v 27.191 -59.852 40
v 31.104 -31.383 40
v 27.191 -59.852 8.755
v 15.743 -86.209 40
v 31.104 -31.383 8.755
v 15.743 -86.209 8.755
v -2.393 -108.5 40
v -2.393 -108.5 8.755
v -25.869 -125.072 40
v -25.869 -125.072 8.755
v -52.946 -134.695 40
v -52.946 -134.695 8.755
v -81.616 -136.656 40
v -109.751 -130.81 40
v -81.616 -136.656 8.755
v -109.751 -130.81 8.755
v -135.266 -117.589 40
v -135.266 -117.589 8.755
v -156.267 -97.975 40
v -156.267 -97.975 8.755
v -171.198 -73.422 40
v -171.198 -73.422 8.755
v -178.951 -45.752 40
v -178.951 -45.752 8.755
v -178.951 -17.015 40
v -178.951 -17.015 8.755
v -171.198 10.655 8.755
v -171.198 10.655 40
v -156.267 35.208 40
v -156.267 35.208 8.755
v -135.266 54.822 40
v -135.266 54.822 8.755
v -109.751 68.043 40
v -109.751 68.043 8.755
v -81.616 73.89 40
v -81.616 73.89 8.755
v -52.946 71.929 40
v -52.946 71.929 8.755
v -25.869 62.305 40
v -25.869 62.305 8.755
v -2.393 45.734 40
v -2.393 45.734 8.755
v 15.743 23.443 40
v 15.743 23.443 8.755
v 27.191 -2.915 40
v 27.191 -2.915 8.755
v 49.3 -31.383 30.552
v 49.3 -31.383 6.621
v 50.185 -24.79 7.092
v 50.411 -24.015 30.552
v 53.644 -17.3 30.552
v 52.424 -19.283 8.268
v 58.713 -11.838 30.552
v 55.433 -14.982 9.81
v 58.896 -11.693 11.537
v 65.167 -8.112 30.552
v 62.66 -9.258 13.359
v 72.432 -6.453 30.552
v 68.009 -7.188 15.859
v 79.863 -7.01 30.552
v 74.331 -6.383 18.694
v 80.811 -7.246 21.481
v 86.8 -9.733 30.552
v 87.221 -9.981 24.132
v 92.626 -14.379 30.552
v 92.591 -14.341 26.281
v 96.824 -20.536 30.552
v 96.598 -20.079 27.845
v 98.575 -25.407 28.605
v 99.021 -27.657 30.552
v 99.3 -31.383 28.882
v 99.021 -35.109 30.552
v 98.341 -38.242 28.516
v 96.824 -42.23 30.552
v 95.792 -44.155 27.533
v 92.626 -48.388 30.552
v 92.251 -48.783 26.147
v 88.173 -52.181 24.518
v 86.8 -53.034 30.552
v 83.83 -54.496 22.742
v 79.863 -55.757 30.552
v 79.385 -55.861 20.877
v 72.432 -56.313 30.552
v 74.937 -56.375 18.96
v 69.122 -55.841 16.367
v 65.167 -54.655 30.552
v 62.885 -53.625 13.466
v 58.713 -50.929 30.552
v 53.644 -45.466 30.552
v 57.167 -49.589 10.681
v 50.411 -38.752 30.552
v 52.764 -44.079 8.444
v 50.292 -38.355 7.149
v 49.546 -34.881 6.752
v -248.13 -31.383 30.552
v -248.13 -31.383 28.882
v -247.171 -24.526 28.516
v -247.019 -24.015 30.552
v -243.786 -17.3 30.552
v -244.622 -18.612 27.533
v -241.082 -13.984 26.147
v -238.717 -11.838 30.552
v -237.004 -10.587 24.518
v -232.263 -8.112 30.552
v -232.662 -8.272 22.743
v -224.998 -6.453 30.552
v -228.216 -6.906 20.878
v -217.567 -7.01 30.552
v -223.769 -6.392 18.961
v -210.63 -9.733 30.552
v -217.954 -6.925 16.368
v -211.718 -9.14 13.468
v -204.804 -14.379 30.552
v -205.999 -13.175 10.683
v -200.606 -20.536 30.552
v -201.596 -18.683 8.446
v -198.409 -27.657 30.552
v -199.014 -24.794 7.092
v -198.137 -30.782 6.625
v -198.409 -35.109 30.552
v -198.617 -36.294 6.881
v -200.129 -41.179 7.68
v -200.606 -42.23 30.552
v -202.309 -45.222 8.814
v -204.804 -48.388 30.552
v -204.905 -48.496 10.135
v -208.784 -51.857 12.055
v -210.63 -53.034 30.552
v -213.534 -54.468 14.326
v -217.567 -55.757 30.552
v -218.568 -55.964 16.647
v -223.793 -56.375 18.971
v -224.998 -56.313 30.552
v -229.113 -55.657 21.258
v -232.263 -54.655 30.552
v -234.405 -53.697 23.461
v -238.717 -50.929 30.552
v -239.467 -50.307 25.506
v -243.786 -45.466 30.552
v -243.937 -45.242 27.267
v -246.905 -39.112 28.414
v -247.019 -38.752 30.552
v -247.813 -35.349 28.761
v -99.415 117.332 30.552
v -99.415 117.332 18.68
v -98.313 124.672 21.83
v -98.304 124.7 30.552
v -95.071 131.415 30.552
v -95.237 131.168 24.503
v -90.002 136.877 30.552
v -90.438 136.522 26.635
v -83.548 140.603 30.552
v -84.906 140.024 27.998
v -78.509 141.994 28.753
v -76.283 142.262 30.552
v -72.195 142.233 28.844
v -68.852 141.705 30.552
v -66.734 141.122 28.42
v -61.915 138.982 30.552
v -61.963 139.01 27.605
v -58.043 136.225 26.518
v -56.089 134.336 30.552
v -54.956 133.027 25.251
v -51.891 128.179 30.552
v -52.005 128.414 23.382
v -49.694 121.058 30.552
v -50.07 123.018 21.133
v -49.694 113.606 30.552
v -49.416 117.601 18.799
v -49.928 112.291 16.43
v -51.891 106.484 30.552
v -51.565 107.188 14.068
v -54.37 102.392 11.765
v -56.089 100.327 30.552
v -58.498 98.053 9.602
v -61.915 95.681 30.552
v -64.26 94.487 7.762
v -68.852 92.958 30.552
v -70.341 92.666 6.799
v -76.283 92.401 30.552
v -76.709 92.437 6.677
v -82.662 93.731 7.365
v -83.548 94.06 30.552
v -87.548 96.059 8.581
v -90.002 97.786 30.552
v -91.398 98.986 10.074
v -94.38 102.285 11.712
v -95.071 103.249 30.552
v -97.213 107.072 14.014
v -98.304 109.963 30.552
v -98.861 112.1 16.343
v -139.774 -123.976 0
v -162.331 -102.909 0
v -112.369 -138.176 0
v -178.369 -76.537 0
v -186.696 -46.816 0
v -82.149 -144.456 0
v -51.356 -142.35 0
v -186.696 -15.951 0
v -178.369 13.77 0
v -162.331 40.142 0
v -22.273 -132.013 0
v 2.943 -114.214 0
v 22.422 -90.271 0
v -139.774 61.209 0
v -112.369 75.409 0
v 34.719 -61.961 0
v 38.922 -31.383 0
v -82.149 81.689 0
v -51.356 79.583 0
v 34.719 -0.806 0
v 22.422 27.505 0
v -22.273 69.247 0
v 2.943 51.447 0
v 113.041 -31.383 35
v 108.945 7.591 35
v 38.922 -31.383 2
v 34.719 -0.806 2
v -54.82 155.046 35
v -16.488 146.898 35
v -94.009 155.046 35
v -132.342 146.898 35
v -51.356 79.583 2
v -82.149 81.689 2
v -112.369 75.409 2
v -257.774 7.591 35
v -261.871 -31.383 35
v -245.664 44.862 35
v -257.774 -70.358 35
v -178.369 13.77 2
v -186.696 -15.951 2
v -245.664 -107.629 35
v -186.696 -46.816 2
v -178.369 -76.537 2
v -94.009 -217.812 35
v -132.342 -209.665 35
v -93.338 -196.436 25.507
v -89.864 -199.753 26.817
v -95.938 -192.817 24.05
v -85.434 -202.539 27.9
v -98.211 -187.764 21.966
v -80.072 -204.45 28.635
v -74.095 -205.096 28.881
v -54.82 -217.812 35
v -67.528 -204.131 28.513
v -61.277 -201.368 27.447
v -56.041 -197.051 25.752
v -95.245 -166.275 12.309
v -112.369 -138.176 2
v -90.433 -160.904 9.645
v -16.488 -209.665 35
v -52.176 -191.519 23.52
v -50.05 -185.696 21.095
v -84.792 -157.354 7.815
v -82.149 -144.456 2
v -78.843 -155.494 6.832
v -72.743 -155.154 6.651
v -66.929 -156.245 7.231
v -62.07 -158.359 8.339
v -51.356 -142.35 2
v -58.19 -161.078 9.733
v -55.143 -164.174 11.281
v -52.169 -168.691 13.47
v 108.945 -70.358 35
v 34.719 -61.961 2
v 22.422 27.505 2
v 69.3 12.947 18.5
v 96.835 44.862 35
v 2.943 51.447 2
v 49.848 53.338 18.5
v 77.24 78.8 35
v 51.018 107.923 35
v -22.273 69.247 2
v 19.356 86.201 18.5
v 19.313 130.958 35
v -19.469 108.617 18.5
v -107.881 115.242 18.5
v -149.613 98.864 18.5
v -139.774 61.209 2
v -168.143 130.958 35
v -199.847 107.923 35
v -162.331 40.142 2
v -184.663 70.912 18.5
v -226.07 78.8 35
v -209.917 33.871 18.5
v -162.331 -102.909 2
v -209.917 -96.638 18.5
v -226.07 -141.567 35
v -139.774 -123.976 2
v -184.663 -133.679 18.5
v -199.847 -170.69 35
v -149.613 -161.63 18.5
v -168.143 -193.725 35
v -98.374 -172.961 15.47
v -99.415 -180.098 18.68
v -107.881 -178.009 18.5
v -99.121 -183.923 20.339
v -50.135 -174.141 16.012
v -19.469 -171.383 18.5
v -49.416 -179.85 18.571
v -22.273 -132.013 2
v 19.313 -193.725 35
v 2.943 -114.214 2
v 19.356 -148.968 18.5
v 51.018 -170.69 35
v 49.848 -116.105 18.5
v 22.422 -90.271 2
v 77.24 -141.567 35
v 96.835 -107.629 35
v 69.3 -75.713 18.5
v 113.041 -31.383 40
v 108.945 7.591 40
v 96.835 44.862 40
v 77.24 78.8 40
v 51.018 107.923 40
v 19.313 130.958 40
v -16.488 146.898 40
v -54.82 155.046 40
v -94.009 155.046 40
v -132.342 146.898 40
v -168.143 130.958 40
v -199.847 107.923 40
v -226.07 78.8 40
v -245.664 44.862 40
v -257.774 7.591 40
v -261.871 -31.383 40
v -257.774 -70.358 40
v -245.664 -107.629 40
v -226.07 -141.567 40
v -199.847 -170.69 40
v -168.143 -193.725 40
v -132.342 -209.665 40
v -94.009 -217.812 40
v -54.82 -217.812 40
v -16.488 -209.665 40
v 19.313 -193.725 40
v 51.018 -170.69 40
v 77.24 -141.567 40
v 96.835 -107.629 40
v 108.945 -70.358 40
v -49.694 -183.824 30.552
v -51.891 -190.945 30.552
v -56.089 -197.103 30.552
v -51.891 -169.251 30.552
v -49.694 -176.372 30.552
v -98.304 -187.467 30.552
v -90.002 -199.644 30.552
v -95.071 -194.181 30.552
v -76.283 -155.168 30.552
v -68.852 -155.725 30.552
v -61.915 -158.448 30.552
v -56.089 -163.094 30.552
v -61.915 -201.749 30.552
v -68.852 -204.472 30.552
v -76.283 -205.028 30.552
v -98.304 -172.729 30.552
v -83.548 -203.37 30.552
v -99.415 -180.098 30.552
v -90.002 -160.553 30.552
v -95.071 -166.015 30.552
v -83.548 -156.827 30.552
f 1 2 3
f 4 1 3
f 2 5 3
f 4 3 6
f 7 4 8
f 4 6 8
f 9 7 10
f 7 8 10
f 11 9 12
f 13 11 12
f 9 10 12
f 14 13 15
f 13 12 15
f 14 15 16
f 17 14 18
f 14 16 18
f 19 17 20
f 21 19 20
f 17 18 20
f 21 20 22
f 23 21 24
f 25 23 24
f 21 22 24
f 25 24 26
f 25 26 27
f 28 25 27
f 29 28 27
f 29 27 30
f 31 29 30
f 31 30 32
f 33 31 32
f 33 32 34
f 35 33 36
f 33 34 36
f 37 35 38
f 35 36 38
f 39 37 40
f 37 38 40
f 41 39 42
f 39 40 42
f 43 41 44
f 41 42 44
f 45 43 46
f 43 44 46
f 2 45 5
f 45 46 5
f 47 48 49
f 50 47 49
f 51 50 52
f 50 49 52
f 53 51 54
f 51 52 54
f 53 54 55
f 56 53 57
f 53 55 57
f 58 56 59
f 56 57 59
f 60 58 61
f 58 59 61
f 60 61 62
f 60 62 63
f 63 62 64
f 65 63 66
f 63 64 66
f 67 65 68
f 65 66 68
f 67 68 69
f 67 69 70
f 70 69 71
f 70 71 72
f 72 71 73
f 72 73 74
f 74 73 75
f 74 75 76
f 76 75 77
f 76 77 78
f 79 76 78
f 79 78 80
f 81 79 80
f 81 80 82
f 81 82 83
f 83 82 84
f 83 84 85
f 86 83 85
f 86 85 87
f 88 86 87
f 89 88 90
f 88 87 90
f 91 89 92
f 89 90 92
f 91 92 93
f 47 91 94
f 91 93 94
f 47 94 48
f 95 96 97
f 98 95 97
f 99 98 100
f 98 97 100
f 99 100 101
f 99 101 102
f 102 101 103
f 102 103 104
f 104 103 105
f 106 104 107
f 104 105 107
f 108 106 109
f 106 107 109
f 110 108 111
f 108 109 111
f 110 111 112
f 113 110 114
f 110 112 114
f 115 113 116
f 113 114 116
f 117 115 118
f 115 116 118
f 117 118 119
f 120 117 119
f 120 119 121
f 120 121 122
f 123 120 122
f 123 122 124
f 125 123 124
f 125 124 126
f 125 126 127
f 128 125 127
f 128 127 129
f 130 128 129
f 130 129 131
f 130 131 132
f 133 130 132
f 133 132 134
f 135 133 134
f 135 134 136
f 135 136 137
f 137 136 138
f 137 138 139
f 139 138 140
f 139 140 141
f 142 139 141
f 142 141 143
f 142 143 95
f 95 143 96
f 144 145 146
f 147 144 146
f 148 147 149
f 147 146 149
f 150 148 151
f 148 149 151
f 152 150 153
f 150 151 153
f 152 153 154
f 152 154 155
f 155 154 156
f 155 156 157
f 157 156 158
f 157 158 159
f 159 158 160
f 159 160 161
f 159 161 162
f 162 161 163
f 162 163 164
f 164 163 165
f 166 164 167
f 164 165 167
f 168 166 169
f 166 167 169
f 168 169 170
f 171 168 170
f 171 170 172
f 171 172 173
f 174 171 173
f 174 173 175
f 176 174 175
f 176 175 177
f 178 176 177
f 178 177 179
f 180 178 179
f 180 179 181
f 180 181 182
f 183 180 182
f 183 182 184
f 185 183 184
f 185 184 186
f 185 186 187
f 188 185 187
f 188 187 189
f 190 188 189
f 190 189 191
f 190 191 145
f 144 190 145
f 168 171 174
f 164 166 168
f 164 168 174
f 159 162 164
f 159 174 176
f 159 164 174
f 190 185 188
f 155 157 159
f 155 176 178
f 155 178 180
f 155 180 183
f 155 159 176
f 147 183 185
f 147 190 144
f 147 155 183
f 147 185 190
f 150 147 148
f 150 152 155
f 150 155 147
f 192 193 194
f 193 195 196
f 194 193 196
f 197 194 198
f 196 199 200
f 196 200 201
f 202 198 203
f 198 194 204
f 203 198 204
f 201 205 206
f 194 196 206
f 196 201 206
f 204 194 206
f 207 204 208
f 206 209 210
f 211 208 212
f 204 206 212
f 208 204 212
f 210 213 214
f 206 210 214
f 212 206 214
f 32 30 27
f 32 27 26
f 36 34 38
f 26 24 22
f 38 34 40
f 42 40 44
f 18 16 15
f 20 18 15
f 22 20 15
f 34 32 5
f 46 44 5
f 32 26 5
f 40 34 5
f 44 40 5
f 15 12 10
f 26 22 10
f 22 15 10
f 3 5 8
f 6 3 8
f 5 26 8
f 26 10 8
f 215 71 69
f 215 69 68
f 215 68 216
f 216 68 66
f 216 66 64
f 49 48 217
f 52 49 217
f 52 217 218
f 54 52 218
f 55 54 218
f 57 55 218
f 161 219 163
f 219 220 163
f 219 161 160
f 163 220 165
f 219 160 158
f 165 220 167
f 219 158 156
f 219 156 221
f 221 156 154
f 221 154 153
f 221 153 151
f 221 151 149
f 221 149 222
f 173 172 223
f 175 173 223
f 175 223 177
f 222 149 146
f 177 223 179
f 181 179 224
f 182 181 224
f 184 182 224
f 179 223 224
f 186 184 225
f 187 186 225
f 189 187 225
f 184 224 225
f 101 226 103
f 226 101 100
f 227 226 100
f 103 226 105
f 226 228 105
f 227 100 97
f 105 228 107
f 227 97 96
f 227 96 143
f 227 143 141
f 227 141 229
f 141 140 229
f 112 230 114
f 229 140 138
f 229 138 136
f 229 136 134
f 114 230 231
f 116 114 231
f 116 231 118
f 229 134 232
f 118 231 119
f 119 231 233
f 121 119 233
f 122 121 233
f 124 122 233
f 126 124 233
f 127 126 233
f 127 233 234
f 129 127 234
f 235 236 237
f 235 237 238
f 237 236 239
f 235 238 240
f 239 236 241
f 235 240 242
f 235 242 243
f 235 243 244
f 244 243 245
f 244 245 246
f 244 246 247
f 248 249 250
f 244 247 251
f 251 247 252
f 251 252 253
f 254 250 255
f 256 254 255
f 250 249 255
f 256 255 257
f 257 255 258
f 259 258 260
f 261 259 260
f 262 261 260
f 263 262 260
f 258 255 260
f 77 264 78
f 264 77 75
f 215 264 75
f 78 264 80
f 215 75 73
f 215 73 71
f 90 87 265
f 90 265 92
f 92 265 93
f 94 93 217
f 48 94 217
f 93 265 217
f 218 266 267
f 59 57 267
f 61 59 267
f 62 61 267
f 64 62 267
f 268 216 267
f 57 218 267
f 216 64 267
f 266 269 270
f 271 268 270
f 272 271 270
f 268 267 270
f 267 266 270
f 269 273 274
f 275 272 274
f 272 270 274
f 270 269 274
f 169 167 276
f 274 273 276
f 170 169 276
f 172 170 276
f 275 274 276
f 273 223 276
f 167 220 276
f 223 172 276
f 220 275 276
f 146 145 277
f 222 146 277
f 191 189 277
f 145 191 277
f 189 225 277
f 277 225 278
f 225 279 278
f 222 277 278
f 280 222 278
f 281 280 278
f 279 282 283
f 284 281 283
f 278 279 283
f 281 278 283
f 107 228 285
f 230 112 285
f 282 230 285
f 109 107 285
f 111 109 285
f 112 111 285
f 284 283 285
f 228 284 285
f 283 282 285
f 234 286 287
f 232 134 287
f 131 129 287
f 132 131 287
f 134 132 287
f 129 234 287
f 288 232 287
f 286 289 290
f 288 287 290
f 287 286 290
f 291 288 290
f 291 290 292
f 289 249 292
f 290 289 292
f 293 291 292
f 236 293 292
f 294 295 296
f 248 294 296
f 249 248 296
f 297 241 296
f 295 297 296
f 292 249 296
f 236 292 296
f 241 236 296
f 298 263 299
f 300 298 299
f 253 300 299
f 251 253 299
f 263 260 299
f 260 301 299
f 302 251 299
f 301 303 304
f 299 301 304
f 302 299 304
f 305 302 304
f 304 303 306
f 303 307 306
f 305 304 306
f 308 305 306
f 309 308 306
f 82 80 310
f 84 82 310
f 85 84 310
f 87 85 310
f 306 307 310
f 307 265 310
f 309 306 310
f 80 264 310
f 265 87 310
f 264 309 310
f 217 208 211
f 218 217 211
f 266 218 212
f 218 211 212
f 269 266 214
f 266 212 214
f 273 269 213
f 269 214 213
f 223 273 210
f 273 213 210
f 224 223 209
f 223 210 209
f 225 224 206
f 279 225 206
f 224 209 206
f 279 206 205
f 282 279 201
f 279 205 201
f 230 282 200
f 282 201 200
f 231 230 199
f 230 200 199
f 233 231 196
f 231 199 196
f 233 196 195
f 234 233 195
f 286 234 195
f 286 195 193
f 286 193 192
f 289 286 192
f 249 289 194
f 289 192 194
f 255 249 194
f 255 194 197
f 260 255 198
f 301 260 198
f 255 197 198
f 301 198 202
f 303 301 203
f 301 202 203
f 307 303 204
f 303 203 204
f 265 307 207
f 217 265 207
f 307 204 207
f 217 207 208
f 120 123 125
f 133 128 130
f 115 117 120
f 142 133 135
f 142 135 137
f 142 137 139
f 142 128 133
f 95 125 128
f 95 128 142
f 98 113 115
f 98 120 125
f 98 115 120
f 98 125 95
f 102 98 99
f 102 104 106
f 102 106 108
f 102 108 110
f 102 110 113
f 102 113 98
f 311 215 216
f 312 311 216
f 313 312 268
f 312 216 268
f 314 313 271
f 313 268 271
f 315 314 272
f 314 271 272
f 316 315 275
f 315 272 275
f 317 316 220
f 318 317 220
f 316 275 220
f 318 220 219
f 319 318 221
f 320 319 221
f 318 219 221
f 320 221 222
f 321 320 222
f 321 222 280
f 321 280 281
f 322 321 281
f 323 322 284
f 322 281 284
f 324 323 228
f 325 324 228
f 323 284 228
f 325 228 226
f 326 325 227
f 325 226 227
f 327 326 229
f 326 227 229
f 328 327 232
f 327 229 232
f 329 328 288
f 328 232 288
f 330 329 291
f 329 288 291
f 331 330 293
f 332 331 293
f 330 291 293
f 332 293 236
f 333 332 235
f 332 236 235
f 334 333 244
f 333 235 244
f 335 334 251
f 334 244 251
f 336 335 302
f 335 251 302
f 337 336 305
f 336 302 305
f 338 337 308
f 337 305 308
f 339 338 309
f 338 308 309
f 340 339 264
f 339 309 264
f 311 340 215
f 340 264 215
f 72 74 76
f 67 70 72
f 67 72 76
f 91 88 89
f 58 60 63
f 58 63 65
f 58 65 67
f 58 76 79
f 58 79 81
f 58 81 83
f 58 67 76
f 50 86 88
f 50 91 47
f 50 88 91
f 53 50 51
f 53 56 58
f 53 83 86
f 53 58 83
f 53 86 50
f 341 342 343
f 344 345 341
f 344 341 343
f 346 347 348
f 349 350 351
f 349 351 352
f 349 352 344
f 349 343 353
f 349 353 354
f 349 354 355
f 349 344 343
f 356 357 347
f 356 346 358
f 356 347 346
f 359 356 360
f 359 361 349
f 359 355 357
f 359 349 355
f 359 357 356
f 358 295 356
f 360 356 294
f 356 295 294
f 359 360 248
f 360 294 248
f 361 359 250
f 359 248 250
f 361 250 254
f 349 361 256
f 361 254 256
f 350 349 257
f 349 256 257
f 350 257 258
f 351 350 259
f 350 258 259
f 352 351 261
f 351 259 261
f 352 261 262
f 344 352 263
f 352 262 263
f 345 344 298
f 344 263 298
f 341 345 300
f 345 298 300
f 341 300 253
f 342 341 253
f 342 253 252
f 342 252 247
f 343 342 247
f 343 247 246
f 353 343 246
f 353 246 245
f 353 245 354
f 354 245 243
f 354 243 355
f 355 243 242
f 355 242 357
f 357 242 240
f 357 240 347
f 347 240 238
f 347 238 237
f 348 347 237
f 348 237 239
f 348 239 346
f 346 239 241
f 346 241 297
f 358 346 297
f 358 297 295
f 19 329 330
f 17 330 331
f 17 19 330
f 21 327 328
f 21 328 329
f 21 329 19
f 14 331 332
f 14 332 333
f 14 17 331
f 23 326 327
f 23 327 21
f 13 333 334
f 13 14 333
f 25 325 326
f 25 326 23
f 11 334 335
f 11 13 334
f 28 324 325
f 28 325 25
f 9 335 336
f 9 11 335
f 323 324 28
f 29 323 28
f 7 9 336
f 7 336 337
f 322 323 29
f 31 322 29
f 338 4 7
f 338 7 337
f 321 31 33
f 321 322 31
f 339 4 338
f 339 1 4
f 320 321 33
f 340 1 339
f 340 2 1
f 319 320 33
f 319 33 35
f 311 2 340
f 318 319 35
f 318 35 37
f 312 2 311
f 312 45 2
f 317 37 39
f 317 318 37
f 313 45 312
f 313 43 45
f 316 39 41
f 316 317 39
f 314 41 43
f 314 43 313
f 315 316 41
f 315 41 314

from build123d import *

# Parameters (mm, degrees)
SKETCH1_R           = 113.336684476
BOSS_EXTRUDE1_DEPTH = 2
SKETCH3_R           = 113.336684476
BOSS_EXTRUDE2_DEPTH = 33
BOSS_EXTRUDE2_DRAFT = -66
SKETCH4_R           = 187.455898015
BOSS_EXTRUDE3_DEPTH = 5
SKETCH6_W           = 105.518937327
SKETCH6_H           = 48.279891136
SKETCH7_R           = 25
CUT_EXTRUDE1_DEPTH  = 30.552152957


with BuildPart() as part:
    # Sketch1 → Boss-Extrude1 (new body)
    with BuildSketch(Plane.XY):
        with Locations((-74.414862174, -31.38339944)):
            Circle(SKETCH1_R)
    extrude(amount=BOSS_EXTRUDE1_DEPTH)


with BuildPart() as boss_extrude2_tool:
    # Sketch3 → Boss-Extrude2 (with draft: the straight prism first)
    with BuildSketch(Plane.XY.offset(2)):
        with Locations((-74.414862174, -31.38339944)):
            Circle(SKETCH3_R)
    extrude(amount=BOSS_EXTRUDE2_DEPTH)
    # Boss-Extrude2: the draft: its side faces are tilted about the plane it starts from
    boss_extrude2_sides = [boss_extrude2_tool.faces().sort_by_distance(p)[0] for p in [
        (-187.75154665, -31.38339944, 18.5),
    ]]
    draft(boss_extrude2_sides, Plane.XY.offset(2), BOSS_EXTRUDE2_DRAFT)


with BuildPart() as part_1:
    add(part.part)

    # Boss-Extrude2: add boss_extrude2_tool
    add(boss_extrude2_tool.part)

    # Sketch4 → Boss-Extrude3 (add)
    with BuildSketch(Plane.XY.offset(35)):
        with Locations((-74.414862174, -31.38339944)):
            Circle(SKETCH4_R)
    extrude(amount=BOSS_EXTRUDE3_DEPTH)

    # Sketch6 → Cut-Revolve1 (revolve, cut)
    with BuildSketch(Plane(origin=(0, -31.38339944, 0), x_dir=(-1, 0, 0), z_dir=(0, -1, 0))):
        with Locations((21.655393511, -32.895152959)):
            Rectangle(SKETCH6_W, SKETCH6_H)
    revolve(axis=Axis((-74.414862174, -31.38339944, -21.108642796), (0, 0, -1)), mode=Mode.SUBTRACT)

    # Sketch7 → Cut-Extrude1 (cut)
    with BuildSketch(Plane(origin=(0, 0, 0), x_dir=(-1, 0, 0), z_dir=(0, 0, -1))):
        with Locations((-74.30011683, -31.38339944)):
            Circle(SKETCH7_R)
        with Locations((74.414862174, -180.098378444)):
            Circle(SKETCH7_R)
        with Locations((74.414862174, 117.331579563)):
            Circle(SKETCH7_R)
        with Locations((223.129841177, -31.38339944)):
            Circle(SKETCH7_R)
    extrude(amount=-CUT_EXTRUDE1_DEPTH, mode=Mode.SUBTRACT)


solid = part_1.part
